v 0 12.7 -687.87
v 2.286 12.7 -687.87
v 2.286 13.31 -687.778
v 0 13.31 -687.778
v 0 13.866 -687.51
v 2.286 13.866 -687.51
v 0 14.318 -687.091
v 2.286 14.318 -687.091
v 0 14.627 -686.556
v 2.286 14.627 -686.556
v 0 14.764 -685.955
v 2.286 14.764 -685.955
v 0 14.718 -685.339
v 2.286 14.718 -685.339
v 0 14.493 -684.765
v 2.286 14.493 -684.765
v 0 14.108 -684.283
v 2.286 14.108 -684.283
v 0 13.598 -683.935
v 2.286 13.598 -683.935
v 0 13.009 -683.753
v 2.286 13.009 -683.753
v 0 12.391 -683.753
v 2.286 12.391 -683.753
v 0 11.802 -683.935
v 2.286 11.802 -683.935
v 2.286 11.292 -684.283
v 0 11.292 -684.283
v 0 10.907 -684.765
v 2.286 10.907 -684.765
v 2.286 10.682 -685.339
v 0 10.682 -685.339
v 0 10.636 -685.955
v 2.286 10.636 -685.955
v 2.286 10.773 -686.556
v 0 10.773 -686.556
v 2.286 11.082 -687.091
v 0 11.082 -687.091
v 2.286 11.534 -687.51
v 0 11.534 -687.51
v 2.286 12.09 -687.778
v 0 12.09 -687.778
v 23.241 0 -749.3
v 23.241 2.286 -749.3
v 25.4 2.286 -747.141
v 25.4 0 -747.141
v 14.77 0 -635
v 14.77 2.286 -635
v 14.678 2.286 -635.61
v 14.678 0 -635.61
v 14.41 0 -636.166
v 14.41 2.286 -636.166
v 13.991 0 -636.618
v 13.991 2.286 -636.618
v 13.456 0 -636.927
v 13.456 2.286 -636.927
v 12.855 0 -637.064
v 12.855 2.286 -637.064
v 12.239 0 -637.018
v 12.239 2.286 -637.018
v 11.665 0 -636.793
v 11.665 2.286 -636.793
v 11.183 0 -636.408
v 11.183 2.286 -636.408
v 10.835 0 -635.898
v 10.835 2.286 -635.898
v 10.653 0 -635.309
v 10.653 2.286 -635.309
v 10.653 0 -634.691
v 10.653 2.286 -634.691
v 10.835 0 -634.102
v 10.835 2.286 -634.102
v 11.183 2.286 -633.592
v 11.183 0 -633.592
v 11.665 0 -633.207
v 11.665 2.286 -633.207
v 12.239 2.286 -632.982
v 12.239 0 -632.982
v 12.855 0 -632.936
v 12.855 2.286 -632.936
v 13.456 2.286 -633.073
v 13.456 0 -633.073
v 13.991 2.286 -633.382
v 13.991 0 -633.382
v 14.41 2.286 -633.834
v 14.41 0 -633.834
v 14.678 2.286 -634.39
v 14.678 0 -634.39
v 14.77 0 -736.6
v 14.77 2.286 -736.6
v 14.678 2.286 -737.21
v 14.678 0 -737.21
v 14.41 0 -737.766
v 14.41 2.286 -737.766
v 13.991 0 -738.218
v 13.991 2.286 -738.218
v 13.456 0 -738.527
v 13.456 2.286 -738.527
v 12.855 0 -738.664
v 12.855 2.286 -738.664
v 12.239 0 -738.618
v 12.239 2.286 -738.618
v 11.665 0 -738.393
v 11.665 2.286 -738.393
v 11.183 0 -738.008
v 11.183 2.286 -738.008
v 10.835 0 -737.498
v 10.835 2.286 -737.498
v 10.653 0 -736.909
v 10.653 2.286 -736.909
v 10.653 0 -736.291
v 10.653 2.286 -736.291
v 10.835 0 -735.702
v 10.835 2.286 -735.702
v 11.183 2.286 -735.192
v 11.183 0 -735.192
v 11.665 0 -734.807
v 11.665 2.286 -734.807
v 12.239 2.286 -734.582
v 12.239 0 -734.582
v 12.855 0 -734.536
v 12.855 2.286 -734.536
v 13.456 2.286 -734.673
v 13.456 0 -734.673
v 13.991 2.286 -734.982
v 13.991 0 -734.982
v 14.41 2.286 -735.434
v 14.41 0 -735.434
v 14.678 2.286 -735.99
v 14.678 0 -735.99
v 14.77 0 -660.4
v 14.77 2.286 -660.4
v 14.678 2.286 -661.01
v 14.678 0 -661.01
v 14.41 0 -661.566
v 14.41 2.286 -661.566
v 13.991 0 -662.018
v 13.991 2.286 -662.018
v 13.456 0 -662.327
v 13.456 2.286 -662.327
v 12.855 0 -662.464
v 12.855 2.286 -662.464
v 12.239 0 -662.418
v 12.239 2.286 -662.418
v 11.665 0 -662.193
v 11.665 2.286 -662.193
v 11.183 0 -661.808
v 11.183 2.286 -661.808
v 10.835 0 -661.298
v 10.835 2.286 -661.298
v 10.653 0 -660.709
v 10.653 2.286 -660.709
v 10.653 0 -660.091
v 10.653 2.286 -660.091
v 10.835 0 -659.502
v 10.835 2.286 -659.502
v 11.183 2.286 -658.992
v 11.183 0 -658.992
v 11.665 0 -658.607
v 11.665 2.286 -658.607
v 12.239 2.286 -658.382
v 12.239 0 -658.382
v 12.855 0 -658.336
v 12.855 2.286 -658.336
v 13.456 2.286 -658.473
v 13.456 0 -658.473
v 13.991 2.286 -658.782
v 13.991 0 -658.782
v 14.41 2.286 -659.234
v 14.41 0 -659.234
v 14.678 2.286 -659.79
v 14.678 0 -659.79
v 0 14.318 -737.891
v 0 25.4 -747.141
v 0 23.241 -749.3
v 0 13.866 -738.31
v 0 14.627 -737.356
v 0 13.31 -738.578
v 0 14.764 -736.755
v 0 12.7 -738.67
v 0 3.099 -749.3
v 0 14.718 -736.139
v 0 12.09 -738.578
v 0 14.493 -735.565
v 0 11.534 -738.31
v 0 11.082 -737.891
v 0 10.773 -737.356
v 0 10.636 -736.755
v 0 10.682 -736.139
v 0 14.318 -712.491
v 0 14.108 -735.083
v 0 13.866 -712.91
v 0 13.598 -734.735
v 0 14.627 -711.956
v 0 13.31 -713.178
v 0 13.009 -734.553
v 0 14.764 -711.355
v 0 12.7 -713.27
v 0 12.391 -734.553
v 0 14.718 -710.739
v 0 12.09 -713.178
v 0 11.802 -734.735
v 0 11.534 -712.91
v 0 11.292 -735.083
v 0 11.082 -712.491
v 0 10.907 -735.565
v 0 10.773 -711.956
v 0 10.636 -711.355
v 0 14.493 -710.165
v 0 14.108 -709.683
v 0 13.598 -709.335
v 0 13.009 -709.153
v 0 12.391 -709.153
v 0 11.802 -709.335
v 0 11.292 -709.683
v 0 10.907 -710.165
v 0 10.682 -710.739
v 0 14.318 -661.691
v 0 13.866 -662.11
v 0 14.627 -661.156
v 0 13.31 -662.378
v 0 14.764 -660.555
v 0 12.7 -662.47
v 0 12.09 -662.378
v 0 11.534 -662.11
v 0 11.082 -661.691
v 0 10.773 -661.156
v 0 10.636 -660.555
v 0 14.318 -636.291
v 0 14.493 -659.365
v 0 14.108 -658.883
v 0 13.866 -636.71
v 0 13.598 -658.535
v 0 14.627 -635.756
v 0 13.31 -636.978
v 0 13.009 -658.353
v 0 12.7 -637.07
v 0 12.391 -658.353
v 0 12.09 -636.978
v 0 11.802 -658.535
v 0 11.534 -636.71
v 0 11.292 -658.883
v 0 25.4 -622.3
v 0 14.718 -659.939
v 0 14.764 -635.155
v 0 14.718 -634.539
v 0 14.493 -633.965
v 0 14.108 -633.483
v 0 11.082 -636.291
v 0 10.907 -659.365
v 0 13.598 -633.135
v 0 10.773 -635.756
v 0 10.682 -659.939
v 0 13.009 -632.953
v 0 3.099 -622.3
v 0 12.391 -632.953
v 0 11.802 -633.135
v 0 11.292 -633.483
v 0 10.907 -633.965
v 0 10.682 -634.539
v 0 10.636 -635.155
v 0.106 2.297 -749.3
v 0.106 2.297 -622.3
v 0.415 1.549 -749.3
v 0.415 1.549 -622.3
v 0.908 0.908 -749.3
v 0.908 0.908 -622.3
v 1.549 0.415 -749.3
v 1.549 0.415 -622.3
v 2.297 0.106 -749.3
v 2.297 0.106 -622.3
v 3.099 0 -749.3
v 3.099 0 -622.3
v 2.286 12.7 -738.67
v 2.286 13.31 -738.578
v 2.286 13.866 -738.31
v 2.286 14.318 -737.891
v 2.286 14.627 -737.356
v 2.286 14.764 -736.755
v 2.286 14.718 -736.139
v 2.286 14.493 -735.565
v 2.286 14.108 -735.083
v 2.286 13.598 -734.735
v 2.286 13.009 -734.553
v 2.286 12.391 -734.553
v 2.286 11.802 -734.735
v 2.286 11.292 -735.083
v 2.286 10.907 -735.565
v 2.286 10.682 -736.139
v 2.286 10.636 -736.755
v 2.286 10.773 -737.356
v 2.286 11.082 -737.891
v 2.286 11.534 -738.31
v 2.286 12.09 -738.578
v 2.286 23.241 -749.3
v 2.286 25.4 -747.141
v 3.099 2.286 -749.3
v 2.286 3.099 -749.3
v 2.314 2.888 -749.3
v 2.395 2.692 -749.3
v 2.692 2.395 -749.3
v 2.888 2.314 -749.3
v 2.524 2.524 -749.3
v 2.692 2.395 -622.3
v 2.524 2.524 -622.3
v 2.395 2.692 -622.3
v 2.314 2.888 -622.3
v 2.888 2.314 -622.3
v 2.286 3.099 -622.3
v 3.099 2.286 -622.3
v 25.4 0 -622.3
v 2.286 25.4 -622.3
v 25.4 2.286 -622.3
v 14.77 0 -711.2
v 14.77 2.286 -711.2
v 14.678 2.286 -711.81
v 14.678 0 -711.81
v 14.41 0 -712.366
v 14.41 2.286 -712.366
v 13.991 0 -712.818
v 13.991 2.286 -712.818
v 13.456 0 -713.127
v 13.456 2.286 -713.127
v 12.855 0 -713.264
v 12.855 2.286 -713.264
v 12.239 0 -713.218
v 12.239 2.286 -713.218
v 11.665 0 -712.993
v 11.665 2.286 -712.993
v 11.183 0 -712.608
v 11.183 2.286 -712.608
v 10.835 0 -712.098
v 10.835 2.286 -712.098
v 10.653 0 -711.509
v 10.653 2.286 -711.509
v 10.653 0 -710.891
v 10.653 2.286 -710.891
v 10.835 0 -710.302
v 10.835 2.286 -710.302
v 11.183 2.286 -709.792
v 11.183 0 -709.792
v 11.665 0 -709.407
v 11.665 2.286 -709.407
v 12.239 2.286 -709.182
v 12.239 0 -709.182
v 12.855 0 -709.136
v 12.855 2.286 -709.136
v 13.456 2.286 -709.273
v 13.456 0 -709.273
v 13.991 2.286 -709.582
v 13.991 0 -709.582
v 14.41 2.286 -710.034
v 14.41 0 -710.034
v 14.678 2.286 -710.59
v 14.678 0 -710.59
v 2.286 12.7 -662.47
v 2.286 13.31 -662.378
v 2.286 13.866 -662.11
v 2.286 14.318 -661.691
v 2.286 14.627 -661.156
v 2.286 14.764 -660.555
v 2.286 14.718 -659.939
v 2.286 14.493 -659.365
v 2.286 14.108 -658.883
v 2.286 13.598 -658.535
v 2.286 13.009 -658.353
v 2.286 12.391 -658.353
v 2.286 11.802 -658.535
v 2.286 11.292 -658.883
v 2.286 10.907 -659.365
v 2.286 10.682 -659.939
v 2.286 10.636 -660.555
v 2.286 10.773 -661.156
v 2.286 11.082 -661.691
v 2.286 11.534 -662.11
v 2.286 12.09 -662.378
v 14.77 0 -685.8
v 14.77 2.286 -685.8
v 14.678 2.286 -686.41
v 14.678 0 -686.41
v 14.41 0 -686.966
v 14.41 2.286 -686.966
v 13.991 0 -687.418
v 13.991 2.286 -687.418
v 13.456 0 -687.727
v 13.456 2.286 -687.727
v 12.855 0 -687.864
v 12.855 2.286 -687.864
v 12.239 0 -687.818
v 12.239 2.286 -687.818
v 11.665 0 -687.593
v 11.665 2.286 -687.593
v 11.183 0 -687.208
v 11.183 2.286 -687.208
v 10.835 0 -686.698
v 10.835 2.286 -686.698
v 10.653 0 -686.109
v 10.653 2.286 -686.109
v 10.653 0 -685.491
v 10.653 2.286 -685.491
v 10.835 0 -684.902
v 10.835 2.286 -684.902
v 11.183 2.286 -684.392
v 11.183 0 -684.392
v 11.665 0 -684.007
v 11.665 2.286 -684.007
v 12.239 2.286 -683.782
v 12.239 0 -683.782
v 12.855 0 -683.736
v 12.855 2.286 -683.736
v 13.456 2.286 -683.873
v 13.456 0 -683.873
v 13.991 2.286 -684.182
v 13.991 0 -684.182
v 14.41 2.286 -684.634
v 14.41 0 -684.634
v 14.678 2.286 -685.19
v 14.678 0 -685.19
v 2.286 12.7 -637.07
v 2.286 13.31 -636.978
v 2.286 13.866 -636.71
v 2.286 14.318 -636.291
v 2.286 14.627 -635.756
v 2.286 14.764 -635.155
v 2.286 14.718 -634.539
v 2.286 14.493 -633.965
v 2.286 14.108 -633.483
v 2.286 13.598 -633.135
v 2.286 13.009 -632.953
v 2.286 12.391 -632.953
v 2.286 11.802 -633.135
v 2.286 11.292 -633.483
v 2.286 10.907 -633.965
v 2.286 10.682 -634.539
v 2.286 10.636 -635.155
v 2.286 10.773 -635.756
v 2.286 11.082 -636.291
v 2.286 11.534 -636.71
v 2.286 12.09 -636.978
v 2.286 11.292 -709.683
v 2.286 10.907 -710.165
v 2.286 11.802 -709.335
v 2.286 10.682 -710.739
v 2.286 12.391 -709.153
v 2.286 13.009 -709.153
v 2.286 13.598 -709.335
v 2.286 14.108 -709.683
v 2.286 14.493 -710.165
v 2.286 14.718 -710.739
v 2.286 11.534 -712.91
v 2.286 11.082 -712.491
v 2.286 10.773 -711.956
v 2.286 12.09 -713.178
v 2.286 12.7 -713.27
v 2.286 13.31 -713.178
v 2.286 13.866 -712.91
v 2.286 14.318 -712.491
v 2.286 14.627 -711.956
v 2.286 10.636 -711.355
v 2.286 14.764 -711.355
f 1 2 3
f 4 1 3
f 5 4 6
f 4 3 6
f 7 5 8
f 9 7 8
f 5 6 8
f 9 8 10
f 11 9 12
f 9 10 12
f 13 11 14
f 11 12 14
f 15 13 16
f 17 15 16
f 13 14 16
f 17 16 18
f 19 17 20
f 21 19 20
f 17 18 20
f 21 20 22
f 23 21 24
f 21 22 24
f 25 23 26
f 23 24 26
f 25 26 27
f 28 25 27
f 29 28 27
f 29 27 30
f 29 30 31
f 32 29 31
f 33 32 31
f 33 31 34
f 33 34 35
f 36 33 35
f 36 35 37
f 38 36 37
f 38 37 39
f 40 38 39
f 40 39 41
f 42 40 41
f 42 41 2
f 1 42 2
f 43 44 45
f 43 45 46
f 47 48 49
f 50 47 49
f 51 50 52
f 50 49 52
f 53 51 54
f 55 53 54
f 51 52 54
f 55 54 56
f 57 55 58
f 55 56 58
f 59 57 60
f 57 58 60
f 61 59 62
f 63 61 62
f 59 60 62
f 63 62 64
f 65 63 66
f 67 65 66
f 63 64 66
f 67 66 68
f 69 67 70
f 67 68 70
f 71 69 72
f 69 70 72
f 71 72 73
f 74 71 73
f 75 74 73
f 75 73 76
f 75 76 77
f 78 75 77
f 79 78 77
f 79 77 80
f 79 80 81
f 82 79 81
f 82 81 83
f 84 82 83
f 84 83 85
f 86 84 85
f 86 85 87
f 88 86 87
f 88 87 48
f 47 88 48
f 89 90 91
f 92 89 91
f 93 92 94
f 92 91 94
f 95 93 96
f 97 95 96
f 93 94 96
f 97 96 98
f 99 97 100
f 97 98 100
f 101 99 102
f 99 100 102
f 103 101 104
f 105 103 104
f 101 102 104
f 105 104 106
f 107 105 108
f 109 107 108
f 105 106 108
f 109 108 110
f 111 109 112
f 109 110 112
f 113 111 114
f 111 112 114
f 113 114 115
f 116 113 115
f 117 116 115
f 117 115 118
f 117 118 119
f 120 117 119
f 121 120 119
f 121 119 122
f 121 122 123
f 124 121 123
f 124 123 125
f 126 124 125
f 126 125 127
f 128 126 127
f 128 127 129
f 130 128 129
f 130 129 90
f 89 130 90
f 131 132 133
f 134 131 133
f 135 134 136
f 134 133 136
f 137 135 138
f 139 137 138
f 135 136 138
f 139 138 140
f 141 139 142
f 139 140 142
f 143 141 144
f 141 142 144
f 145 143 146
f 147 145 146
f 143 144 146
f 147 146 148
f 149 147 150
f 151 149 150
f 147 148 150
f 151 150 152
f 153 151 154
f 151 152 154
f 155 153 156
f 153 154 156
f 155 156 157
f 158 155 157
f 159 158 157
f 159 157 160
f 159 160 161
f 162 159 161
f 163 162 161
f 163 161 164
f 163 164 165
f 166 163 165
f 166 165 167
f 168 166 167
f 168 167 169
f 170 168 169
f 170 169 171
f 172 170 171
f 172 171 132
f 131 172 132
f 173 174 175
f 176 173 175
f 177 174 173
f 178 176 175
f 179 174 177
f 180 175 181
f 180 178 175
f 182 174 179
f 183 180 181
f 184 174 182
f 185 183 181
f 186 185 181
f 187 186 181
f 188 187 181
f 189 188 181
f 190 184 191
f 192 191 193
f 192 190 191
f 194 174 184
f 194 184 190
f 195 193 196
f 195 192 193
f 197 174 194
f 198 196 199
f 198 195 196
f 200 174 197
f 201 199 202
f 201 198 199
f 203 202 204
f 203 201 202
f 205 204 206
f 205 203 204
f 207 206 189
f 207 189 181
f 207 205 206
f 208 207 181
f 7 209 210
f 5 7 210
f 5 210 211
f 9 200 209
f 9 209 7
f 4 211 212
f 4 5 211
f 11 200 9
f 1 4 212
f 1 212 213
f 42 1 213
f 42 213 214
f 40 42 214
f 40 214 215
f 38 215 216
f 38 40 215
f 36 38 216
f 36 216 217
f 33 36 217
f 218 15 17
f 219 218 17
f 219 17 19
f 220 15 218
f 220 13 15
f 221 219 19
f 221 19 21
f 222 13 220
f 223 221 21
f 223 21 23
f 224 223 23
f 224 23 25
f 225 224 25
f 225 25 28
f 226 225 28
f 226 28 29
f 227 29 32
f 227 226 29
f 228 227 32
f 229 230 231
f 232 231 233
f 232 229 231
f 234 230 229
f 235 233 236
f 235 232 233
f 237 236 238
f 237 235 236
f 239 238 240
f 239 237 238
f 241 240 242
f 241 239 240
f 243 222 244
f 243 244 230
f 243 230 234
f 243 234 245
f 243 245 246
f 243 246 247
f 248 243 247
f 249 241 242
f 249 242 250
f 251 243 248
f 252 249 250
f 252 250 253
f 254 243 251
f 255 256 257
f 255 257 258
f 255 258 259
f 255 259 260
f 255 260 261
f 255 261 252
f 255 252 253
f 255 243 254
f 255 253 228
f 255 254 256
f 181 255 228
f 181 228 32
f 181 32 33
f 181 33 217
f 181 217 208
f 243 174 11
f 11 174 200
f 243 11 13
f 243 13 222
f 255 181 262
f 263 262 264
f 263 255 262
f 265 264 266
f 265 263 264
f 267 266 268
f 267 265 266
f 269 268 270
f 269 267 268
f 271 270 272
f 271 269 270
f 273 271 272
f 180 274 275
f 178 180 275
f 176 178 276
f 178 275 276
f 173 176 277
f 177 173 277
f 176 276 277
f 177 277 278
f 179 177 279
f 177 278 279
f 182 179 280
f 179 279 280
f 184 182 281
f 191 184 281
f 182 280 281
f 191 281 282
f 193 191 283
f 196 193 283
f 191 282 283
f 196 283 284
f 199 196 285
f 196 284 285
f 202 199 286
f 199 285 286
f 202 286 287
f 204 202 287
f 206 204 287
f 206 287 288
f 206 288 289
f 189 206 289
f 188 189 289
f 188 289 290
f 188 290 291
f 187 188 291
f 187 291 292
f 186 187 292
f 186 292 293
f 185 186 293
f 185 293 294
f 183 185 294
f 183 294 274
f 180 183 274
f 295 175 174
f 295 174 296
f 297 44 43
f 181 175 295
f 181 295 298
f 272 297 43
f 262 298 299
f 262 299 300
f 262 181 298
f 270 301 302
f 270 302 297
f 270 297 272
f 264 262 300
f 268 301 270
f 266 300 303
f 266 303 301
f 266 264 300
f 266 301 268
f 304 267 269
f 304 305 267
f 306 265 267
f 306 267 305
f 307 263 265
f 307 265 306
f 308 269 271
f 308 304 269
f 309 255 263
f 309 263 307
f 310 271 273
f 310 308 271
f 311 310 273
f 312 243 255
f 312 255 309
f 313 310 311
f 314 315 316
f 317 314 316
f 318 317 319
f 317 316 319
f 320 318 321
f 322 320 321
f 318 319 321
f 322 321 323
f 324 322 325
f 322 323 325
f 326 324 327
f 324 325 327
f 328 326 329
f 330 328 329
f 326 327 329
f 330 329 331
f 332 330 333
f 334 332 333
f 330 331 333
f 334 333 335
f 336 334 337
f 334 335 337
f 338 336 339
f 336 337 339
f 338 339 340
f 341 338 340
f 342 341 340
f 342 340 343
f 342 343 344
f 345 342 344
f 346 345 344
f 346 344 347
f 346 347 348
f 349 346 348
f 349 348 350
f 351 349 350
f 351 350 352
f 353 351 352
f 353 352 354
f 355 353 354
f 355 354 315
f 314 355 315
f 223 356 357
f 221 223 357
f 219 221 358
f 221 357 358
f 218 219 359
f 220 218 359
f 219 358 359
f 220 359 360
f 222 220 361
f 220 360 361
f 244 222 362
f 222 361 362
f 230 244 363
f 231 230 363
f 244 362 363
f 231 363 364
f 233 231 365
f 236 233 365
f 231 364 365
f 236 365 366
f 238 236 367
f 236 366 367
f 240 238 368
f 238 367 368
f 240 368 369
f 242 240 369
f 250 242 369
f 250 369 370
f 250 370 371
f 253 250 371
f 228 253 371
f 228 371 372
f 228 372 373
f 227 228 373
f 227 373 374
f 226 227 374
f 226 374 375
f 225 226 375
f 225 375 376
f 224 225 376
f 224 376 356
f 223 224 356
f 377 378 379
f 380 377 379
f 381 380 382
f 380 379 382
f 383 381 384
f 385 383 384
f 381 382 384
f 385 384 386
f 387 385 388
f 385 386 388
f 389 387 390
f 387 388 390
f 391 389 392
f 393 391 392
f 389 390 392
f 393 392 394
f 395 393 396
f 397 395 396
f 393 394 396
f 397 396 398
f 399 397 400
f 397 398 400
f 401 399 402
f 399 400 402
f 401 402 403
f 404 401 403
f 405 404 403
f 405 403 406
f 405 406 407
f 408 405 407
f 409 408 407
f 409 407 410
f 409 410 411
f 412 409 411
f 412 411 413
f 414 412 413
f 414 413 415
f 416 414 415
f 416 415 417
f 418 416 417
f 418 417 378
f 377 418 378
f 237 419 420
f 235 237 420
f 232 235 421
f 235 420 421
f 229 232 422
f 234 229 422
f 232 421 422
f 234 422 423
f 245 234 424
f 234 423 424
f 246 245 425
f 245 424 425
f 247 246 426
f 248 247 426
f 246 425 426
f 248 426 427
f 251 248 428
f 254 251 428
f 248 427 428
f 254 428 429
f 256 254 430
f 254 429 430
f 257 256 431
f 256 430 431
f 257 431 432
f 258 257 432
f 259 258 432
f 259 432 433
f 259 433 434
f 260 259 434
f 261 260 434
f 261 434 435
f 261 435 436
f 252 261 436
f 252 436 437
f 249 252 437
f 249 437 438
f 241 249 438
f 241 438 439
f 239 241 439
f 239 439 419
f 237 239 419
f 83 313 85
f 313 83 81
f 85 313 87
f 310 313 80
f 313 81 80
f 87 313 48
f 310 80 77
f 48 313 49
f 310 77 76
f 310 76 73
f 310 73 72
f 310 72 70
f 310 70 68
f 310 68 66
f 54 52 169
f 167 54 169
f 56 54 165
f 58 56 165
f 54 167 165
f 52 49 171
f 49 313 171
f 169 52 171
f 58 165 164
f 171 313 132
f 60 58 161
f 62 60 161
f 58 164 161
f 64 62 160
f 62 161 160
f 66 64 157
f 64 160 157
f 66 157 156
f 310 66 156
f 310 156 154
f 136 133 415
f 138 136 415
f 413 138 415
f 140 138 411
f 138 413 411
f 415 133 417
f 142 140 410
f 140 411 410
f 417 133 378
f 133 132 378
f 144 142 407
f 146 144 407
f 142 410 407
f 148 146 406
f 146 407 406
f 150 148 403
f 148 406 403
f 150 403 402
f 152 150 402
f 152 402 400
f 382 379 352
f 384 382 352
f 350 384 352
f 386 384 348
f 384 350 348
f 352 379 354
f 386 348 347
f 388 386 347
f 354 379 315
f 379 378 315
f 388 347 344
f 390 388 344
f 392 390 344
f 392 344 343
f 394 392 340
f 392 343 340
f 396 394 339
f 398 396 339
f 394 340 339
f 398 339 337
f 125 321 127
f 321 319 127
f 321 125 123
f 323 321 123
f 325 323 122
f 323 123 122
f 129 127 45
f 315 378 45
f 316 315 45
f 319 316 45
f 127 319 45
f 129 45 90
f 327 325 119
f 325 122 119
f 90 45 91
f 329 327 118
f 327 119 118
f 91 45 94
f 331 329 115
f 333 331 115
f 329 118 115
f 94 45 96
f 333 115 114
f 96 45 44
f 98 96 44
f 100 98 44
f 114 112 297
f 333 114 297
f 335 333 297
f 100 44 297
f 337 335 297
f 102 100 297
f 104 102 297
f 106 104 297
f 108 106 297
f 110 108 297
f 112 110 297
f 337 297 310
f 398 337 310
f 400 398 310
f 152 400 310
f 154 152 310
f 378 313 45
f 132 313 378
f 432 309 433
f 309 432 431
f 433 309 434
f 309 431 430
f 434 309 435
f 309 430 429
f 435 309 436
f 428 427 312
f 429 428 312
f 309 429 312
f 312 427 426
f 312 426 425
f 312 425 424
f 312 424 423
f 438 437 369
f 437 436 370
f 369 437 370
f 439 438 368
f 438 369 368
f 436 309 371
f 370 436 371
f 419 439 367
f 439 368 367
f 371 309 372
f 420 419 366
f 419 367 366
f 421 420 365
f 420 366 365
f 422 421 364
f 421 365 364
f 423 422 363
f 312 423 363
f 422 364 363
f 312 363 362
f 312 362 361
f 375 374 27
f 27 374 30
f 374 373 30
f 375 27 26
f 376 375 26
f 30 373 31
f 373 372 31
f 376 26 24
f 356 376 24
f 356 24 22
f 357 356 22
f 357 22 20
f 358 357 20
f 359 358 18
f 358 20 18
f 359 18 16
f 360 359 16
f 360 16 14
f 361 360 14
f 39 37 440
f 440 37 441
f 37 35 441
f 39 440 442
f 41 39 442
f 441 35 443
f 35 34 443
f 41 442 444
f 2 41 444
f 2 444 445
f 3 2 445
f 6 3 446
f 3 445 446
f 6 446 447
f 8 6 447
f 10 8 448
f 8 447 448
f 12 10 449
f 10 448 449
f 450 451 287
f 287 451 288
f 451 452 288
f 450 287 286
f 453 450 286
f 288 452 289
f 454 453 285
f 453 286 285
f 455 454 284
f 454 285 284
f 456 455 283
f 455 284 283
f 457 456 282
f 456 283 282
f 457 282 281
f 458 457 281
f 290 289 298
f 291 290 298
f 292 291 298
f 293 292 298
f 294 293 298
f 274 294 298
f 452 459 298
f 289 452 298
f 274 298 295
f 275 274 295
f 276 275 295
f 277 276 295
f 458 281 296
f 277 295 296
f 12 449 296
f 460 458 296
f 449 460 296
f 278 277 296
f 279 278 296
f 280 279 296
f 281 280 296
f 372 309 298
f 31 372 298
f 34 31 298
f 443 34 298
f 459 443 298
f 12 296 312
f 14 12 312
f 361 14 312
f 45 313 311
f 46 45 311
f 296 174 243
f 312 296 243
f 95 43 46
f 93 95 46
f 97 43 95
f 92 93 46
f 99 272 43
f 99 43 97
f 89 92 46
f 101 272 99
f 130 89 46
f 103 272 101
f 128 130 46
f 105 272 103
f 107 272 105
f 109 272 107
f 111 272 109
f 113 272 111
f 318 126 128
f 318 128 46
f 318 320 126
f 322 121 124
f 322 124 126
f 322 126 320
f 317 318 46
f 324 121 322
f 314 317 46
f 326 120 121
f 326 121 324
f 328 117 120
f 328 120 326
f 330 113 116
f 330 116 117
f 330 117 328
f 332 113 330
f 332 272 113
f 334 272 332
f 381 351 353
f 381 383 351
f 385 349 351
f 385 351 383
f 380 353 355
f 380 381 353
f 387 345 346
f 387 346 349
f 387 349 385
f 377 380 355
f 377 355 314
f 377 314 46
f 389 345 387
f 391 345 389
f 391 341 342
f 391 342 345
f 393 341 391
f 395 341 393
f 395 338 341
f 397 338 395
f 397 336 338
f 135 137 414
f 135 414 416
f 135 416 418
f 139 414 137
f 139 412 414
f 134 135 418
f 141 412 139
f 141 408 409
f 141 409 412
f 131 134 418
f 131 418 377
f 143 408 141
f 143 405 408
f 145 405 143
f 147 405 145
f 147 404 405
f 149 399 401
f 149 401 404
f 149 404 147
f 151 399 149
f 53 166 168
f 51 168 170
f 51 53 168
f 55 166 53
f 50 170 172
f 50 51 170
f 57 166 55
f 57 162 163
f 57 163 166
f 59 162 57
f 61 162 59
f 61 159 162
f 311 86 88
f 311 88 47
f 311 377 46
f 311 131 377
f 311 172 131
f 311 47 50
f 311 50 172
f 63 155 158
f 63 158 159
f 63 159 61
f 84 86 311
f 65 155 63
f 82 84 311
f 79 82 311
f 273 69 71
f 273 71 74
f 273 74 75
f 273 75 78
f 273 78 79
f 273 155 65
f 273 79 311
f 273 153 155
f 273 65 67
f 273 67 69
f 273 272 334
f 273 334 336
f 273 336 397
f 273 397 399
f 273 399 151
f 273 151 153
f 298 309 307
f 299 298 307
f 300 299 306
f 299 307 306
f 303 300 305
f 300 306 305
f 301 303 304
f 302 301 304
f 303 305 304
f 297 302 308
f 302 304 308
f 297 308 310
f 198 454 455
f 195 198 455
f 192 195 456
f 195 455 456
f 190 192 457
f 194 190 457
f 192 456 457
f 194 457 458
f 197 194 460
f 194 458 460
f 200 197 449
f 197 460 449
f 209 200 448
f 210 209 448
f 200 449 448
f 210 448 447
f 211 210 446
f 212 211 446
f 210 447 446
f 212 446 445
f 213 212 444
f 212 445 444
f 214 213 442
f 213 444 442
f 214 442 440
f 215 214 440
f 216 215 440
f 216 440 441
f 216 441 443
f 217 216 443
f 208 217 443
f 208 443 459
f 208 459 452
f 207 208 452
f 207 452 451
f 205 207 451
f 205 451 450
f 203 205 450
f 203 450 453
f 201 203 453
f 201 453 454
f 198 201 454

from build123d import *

# Parameters (mm, degrees)
SKETCH1_W                  = 25.4
SKETCH1_H                  = 1498.6
BOSS_EXTRUDE1_DEPTH        = 25.4
SKETCH2_W                  = 23.114
SKETCH2_H                  = 23.114
CUT_EXTRUDE1_DEPTH         = 1499.6
M3_5_CLEARANCE_HOLE1_D     = 4.1402
M3_5_CLEARANCE_HOLE1_DEPTH = 25.4
M3_5_CLEARANCE_HOLE2_D     = 4.1402
M3_5_CLEARANCE_HOLE2_DEPTH = 25.4
CHAMFER1_SIZE              = 2.159
FILLET1_R                  = 0.8128
FILLET2_R                  = 3.0988
SKETCH8_W                  = 95.882963774
SKETCH8_H                  = 79.338329604
CUT_EXTRUDE3_DEPTH         = 1371.6


with BuildPart() as part:
    # Sketch1 → Boss-Extrude1 (new body)
    with BuildSketch(Plane(origin=(0, 0, 0), x_dir=(0, -1, 0), z_dir=(-1, 0, 0))):
        with Locations((-12.7, 0)):
            Rectangle(SKETCH1_W, SKETCH1_H)
    extrude(amount=-BOSS_EXTRUDE1_DEPTH)

    # Sketch2 → Cut-Extrude1 (cut, through all)
    with BuildSketch(Plane(origin=(0, 0, -749.3), x_dir=(-1, 0, 0), z_dir=(0, 0, -1))):
        with Locations((-13.843, 13.843)):
            Rectangle(SKETCH2_W, SKETCH2_H)
    extrude(amount=-CUT_EXTRUDE1_DEPTH, mode=Mode.SUBTRACT)

    # M3.5 Clearance Hole1
    with Locations(Plane(origin=(0, 0, 0), x_dir=(-1, 0, 0), z_dir=(0, -1, 0))):
        with Locations((-12.7, 736.6), (-12.7, 711.2), (-12.7, 685.8), (-12.7, 660.4), (-12.7, 635), (-12.7, 609.6), (-12.7, 584.2), (-12.7, 558.8), (-12.7, 533.4), (-12.7, 508), (-12.7, 482.6), (-12.7, 457.2), (-12.7, 431.8), (-12.7, 406.4), (-12.7, 381), (-12.7, 355.6), (-12.7, 330.2), (-12.7, 304.8), (-12.7, 279.4), (-12.7, 254), (-12.7, 228.6), (-12.7, 203.2), (-12.7, 177.8), (-12.7, 152.4), (-12.7, 127), (-12.7, 101.6), (-12.7, 76.2), (-12.7, 50.8), (-12.7, 25.4), (-12.7, 0), (-12.7, -25.4), (-12.7, -50.8), (-12.7, -76.2), (-12.7, -101.6), (-12.7, -127), (-12.7, -152.4), (-12.7, -177.8), (-12.7, -203.2), (-12.7, -228.6), (-12.7, -254), (-12.7, -279.4), (-12.7, -304.8), (-12.7, -330.2), (-12.7, -355.6), (-12.7, -381), (-12.7, -406.4), (-12.7, -431.8), (-12.7, -457.2), (-12.7, -482.6), (-12.7, -508), (-12.7, -533.4), (-12.7, -558.8), (-12.7, -584.2), (-12.7, -609.6), (-12.7, -635), (-12.7, -660.4), (-12.7, -685.8), (-12.7, -711.2), (-12.7, -736.6)):
            Hole(M3_5_CLEARANCE_HOLE1_D / 2, depth=M3_5_CLEARANCE_HOLE1_DEPTH)

    # M3.5 Clearance Hole2
    with Locations(Plane.ZY):
        with Locations((711.2, 12.7), (736.6, 12.7), (685.8, 12.7), (660.4, 12.7), (635, 12.7), (609.6, 12.7), (584.2, 12.7), (558.8, 12.7), (533.4, 12.7), (508, 12.7), (482.6, 12.7), (457.2, 12.7), (431.8, 12.7), (406.4, 12.7), (381, 12.7), (355.6, 12.7), (330.2, 12.7), (304.8, 12.7), (279.4, 12.7), (254, 12.7), (228.6, 12.7), (203.2, 12.7), (177.8, 12.7), (152.4, 12.7), (127, 12.7), (101.6, 12.7), (76.2, 12.7), (50.8, 12.7), (25.4, 12.7), (0, 12.7), (-25.4, 12.7), (-50.8, 12.7), (-76.2, 12.7), (-101.6, 12.7), (-127, 12.7), (-152.4, 12.7), (-177.8, 12.7), (-203.2, 12.7), (-228.6, 12.7), (-254, 12.7), (-279.4, 12.7), (-304.8, 12.7), (-330.2, 12.7), (-355.6, 12.7), (-381, 12.7), (-406.4, 12.7), (-431.8, 12.7), (-457.2, 12.7), (-482.6, 12.7), (-508, 12.7), (-533.4, 12.7), (-558.8, 12.7), (-584.2, 12.7), (-609.6, 12.7), (-635, 12.7), (-660.4, 12.7), (-685.8, 12.7), (-711.2, 12.7), (-736.6, 12.7)):
            Hole(M3_5_CLEARANCE_HOLE2_D / 2, depth=M3_5_CLEARANCE_HOLE2_DEPTH)

    # Chamfer1
    chamfer1_edges = [part.edges().sort_by_distance(p)[0] for p in [
        (25.4, 1.143, -749.3),
        (1.143, 25.4, 749.3),
        (1.143, 25.4, -749.3),
        (25.4, 1.143, 749.3),
    ]]
    chamfer(chamfer1_edges, length=CHAMFER1_SIZE)

    # Fillet1
    fillet1_edges = [part.edges().sort_by_distance(p)[0] for p in [
        (2.286, 2.286, 0),
    ]]
    fillet(fillet1_edges, radius=FILLET1_R)

    # Fillet2
    fillet2_edges = [part.edges().sort_by_distance(p)[0] for p in [
        (0, 0, 0),
    ]]
    fillet(fillet2_edges, radius=FILLET2_R)

    # Sketch8 → Cut-Extrude3 (cut)
    with BuildSketch(Plane.XY.offset(749.3)):
        with Locations((2.286, 3.0988)):
            Rectangle(SKETCH8_W, SKETCH8_H)
    extrude(amount=-CUT_EXTRUDE3_DEPTH, mode=Mode.SUBTRACT)


solid = part.part
